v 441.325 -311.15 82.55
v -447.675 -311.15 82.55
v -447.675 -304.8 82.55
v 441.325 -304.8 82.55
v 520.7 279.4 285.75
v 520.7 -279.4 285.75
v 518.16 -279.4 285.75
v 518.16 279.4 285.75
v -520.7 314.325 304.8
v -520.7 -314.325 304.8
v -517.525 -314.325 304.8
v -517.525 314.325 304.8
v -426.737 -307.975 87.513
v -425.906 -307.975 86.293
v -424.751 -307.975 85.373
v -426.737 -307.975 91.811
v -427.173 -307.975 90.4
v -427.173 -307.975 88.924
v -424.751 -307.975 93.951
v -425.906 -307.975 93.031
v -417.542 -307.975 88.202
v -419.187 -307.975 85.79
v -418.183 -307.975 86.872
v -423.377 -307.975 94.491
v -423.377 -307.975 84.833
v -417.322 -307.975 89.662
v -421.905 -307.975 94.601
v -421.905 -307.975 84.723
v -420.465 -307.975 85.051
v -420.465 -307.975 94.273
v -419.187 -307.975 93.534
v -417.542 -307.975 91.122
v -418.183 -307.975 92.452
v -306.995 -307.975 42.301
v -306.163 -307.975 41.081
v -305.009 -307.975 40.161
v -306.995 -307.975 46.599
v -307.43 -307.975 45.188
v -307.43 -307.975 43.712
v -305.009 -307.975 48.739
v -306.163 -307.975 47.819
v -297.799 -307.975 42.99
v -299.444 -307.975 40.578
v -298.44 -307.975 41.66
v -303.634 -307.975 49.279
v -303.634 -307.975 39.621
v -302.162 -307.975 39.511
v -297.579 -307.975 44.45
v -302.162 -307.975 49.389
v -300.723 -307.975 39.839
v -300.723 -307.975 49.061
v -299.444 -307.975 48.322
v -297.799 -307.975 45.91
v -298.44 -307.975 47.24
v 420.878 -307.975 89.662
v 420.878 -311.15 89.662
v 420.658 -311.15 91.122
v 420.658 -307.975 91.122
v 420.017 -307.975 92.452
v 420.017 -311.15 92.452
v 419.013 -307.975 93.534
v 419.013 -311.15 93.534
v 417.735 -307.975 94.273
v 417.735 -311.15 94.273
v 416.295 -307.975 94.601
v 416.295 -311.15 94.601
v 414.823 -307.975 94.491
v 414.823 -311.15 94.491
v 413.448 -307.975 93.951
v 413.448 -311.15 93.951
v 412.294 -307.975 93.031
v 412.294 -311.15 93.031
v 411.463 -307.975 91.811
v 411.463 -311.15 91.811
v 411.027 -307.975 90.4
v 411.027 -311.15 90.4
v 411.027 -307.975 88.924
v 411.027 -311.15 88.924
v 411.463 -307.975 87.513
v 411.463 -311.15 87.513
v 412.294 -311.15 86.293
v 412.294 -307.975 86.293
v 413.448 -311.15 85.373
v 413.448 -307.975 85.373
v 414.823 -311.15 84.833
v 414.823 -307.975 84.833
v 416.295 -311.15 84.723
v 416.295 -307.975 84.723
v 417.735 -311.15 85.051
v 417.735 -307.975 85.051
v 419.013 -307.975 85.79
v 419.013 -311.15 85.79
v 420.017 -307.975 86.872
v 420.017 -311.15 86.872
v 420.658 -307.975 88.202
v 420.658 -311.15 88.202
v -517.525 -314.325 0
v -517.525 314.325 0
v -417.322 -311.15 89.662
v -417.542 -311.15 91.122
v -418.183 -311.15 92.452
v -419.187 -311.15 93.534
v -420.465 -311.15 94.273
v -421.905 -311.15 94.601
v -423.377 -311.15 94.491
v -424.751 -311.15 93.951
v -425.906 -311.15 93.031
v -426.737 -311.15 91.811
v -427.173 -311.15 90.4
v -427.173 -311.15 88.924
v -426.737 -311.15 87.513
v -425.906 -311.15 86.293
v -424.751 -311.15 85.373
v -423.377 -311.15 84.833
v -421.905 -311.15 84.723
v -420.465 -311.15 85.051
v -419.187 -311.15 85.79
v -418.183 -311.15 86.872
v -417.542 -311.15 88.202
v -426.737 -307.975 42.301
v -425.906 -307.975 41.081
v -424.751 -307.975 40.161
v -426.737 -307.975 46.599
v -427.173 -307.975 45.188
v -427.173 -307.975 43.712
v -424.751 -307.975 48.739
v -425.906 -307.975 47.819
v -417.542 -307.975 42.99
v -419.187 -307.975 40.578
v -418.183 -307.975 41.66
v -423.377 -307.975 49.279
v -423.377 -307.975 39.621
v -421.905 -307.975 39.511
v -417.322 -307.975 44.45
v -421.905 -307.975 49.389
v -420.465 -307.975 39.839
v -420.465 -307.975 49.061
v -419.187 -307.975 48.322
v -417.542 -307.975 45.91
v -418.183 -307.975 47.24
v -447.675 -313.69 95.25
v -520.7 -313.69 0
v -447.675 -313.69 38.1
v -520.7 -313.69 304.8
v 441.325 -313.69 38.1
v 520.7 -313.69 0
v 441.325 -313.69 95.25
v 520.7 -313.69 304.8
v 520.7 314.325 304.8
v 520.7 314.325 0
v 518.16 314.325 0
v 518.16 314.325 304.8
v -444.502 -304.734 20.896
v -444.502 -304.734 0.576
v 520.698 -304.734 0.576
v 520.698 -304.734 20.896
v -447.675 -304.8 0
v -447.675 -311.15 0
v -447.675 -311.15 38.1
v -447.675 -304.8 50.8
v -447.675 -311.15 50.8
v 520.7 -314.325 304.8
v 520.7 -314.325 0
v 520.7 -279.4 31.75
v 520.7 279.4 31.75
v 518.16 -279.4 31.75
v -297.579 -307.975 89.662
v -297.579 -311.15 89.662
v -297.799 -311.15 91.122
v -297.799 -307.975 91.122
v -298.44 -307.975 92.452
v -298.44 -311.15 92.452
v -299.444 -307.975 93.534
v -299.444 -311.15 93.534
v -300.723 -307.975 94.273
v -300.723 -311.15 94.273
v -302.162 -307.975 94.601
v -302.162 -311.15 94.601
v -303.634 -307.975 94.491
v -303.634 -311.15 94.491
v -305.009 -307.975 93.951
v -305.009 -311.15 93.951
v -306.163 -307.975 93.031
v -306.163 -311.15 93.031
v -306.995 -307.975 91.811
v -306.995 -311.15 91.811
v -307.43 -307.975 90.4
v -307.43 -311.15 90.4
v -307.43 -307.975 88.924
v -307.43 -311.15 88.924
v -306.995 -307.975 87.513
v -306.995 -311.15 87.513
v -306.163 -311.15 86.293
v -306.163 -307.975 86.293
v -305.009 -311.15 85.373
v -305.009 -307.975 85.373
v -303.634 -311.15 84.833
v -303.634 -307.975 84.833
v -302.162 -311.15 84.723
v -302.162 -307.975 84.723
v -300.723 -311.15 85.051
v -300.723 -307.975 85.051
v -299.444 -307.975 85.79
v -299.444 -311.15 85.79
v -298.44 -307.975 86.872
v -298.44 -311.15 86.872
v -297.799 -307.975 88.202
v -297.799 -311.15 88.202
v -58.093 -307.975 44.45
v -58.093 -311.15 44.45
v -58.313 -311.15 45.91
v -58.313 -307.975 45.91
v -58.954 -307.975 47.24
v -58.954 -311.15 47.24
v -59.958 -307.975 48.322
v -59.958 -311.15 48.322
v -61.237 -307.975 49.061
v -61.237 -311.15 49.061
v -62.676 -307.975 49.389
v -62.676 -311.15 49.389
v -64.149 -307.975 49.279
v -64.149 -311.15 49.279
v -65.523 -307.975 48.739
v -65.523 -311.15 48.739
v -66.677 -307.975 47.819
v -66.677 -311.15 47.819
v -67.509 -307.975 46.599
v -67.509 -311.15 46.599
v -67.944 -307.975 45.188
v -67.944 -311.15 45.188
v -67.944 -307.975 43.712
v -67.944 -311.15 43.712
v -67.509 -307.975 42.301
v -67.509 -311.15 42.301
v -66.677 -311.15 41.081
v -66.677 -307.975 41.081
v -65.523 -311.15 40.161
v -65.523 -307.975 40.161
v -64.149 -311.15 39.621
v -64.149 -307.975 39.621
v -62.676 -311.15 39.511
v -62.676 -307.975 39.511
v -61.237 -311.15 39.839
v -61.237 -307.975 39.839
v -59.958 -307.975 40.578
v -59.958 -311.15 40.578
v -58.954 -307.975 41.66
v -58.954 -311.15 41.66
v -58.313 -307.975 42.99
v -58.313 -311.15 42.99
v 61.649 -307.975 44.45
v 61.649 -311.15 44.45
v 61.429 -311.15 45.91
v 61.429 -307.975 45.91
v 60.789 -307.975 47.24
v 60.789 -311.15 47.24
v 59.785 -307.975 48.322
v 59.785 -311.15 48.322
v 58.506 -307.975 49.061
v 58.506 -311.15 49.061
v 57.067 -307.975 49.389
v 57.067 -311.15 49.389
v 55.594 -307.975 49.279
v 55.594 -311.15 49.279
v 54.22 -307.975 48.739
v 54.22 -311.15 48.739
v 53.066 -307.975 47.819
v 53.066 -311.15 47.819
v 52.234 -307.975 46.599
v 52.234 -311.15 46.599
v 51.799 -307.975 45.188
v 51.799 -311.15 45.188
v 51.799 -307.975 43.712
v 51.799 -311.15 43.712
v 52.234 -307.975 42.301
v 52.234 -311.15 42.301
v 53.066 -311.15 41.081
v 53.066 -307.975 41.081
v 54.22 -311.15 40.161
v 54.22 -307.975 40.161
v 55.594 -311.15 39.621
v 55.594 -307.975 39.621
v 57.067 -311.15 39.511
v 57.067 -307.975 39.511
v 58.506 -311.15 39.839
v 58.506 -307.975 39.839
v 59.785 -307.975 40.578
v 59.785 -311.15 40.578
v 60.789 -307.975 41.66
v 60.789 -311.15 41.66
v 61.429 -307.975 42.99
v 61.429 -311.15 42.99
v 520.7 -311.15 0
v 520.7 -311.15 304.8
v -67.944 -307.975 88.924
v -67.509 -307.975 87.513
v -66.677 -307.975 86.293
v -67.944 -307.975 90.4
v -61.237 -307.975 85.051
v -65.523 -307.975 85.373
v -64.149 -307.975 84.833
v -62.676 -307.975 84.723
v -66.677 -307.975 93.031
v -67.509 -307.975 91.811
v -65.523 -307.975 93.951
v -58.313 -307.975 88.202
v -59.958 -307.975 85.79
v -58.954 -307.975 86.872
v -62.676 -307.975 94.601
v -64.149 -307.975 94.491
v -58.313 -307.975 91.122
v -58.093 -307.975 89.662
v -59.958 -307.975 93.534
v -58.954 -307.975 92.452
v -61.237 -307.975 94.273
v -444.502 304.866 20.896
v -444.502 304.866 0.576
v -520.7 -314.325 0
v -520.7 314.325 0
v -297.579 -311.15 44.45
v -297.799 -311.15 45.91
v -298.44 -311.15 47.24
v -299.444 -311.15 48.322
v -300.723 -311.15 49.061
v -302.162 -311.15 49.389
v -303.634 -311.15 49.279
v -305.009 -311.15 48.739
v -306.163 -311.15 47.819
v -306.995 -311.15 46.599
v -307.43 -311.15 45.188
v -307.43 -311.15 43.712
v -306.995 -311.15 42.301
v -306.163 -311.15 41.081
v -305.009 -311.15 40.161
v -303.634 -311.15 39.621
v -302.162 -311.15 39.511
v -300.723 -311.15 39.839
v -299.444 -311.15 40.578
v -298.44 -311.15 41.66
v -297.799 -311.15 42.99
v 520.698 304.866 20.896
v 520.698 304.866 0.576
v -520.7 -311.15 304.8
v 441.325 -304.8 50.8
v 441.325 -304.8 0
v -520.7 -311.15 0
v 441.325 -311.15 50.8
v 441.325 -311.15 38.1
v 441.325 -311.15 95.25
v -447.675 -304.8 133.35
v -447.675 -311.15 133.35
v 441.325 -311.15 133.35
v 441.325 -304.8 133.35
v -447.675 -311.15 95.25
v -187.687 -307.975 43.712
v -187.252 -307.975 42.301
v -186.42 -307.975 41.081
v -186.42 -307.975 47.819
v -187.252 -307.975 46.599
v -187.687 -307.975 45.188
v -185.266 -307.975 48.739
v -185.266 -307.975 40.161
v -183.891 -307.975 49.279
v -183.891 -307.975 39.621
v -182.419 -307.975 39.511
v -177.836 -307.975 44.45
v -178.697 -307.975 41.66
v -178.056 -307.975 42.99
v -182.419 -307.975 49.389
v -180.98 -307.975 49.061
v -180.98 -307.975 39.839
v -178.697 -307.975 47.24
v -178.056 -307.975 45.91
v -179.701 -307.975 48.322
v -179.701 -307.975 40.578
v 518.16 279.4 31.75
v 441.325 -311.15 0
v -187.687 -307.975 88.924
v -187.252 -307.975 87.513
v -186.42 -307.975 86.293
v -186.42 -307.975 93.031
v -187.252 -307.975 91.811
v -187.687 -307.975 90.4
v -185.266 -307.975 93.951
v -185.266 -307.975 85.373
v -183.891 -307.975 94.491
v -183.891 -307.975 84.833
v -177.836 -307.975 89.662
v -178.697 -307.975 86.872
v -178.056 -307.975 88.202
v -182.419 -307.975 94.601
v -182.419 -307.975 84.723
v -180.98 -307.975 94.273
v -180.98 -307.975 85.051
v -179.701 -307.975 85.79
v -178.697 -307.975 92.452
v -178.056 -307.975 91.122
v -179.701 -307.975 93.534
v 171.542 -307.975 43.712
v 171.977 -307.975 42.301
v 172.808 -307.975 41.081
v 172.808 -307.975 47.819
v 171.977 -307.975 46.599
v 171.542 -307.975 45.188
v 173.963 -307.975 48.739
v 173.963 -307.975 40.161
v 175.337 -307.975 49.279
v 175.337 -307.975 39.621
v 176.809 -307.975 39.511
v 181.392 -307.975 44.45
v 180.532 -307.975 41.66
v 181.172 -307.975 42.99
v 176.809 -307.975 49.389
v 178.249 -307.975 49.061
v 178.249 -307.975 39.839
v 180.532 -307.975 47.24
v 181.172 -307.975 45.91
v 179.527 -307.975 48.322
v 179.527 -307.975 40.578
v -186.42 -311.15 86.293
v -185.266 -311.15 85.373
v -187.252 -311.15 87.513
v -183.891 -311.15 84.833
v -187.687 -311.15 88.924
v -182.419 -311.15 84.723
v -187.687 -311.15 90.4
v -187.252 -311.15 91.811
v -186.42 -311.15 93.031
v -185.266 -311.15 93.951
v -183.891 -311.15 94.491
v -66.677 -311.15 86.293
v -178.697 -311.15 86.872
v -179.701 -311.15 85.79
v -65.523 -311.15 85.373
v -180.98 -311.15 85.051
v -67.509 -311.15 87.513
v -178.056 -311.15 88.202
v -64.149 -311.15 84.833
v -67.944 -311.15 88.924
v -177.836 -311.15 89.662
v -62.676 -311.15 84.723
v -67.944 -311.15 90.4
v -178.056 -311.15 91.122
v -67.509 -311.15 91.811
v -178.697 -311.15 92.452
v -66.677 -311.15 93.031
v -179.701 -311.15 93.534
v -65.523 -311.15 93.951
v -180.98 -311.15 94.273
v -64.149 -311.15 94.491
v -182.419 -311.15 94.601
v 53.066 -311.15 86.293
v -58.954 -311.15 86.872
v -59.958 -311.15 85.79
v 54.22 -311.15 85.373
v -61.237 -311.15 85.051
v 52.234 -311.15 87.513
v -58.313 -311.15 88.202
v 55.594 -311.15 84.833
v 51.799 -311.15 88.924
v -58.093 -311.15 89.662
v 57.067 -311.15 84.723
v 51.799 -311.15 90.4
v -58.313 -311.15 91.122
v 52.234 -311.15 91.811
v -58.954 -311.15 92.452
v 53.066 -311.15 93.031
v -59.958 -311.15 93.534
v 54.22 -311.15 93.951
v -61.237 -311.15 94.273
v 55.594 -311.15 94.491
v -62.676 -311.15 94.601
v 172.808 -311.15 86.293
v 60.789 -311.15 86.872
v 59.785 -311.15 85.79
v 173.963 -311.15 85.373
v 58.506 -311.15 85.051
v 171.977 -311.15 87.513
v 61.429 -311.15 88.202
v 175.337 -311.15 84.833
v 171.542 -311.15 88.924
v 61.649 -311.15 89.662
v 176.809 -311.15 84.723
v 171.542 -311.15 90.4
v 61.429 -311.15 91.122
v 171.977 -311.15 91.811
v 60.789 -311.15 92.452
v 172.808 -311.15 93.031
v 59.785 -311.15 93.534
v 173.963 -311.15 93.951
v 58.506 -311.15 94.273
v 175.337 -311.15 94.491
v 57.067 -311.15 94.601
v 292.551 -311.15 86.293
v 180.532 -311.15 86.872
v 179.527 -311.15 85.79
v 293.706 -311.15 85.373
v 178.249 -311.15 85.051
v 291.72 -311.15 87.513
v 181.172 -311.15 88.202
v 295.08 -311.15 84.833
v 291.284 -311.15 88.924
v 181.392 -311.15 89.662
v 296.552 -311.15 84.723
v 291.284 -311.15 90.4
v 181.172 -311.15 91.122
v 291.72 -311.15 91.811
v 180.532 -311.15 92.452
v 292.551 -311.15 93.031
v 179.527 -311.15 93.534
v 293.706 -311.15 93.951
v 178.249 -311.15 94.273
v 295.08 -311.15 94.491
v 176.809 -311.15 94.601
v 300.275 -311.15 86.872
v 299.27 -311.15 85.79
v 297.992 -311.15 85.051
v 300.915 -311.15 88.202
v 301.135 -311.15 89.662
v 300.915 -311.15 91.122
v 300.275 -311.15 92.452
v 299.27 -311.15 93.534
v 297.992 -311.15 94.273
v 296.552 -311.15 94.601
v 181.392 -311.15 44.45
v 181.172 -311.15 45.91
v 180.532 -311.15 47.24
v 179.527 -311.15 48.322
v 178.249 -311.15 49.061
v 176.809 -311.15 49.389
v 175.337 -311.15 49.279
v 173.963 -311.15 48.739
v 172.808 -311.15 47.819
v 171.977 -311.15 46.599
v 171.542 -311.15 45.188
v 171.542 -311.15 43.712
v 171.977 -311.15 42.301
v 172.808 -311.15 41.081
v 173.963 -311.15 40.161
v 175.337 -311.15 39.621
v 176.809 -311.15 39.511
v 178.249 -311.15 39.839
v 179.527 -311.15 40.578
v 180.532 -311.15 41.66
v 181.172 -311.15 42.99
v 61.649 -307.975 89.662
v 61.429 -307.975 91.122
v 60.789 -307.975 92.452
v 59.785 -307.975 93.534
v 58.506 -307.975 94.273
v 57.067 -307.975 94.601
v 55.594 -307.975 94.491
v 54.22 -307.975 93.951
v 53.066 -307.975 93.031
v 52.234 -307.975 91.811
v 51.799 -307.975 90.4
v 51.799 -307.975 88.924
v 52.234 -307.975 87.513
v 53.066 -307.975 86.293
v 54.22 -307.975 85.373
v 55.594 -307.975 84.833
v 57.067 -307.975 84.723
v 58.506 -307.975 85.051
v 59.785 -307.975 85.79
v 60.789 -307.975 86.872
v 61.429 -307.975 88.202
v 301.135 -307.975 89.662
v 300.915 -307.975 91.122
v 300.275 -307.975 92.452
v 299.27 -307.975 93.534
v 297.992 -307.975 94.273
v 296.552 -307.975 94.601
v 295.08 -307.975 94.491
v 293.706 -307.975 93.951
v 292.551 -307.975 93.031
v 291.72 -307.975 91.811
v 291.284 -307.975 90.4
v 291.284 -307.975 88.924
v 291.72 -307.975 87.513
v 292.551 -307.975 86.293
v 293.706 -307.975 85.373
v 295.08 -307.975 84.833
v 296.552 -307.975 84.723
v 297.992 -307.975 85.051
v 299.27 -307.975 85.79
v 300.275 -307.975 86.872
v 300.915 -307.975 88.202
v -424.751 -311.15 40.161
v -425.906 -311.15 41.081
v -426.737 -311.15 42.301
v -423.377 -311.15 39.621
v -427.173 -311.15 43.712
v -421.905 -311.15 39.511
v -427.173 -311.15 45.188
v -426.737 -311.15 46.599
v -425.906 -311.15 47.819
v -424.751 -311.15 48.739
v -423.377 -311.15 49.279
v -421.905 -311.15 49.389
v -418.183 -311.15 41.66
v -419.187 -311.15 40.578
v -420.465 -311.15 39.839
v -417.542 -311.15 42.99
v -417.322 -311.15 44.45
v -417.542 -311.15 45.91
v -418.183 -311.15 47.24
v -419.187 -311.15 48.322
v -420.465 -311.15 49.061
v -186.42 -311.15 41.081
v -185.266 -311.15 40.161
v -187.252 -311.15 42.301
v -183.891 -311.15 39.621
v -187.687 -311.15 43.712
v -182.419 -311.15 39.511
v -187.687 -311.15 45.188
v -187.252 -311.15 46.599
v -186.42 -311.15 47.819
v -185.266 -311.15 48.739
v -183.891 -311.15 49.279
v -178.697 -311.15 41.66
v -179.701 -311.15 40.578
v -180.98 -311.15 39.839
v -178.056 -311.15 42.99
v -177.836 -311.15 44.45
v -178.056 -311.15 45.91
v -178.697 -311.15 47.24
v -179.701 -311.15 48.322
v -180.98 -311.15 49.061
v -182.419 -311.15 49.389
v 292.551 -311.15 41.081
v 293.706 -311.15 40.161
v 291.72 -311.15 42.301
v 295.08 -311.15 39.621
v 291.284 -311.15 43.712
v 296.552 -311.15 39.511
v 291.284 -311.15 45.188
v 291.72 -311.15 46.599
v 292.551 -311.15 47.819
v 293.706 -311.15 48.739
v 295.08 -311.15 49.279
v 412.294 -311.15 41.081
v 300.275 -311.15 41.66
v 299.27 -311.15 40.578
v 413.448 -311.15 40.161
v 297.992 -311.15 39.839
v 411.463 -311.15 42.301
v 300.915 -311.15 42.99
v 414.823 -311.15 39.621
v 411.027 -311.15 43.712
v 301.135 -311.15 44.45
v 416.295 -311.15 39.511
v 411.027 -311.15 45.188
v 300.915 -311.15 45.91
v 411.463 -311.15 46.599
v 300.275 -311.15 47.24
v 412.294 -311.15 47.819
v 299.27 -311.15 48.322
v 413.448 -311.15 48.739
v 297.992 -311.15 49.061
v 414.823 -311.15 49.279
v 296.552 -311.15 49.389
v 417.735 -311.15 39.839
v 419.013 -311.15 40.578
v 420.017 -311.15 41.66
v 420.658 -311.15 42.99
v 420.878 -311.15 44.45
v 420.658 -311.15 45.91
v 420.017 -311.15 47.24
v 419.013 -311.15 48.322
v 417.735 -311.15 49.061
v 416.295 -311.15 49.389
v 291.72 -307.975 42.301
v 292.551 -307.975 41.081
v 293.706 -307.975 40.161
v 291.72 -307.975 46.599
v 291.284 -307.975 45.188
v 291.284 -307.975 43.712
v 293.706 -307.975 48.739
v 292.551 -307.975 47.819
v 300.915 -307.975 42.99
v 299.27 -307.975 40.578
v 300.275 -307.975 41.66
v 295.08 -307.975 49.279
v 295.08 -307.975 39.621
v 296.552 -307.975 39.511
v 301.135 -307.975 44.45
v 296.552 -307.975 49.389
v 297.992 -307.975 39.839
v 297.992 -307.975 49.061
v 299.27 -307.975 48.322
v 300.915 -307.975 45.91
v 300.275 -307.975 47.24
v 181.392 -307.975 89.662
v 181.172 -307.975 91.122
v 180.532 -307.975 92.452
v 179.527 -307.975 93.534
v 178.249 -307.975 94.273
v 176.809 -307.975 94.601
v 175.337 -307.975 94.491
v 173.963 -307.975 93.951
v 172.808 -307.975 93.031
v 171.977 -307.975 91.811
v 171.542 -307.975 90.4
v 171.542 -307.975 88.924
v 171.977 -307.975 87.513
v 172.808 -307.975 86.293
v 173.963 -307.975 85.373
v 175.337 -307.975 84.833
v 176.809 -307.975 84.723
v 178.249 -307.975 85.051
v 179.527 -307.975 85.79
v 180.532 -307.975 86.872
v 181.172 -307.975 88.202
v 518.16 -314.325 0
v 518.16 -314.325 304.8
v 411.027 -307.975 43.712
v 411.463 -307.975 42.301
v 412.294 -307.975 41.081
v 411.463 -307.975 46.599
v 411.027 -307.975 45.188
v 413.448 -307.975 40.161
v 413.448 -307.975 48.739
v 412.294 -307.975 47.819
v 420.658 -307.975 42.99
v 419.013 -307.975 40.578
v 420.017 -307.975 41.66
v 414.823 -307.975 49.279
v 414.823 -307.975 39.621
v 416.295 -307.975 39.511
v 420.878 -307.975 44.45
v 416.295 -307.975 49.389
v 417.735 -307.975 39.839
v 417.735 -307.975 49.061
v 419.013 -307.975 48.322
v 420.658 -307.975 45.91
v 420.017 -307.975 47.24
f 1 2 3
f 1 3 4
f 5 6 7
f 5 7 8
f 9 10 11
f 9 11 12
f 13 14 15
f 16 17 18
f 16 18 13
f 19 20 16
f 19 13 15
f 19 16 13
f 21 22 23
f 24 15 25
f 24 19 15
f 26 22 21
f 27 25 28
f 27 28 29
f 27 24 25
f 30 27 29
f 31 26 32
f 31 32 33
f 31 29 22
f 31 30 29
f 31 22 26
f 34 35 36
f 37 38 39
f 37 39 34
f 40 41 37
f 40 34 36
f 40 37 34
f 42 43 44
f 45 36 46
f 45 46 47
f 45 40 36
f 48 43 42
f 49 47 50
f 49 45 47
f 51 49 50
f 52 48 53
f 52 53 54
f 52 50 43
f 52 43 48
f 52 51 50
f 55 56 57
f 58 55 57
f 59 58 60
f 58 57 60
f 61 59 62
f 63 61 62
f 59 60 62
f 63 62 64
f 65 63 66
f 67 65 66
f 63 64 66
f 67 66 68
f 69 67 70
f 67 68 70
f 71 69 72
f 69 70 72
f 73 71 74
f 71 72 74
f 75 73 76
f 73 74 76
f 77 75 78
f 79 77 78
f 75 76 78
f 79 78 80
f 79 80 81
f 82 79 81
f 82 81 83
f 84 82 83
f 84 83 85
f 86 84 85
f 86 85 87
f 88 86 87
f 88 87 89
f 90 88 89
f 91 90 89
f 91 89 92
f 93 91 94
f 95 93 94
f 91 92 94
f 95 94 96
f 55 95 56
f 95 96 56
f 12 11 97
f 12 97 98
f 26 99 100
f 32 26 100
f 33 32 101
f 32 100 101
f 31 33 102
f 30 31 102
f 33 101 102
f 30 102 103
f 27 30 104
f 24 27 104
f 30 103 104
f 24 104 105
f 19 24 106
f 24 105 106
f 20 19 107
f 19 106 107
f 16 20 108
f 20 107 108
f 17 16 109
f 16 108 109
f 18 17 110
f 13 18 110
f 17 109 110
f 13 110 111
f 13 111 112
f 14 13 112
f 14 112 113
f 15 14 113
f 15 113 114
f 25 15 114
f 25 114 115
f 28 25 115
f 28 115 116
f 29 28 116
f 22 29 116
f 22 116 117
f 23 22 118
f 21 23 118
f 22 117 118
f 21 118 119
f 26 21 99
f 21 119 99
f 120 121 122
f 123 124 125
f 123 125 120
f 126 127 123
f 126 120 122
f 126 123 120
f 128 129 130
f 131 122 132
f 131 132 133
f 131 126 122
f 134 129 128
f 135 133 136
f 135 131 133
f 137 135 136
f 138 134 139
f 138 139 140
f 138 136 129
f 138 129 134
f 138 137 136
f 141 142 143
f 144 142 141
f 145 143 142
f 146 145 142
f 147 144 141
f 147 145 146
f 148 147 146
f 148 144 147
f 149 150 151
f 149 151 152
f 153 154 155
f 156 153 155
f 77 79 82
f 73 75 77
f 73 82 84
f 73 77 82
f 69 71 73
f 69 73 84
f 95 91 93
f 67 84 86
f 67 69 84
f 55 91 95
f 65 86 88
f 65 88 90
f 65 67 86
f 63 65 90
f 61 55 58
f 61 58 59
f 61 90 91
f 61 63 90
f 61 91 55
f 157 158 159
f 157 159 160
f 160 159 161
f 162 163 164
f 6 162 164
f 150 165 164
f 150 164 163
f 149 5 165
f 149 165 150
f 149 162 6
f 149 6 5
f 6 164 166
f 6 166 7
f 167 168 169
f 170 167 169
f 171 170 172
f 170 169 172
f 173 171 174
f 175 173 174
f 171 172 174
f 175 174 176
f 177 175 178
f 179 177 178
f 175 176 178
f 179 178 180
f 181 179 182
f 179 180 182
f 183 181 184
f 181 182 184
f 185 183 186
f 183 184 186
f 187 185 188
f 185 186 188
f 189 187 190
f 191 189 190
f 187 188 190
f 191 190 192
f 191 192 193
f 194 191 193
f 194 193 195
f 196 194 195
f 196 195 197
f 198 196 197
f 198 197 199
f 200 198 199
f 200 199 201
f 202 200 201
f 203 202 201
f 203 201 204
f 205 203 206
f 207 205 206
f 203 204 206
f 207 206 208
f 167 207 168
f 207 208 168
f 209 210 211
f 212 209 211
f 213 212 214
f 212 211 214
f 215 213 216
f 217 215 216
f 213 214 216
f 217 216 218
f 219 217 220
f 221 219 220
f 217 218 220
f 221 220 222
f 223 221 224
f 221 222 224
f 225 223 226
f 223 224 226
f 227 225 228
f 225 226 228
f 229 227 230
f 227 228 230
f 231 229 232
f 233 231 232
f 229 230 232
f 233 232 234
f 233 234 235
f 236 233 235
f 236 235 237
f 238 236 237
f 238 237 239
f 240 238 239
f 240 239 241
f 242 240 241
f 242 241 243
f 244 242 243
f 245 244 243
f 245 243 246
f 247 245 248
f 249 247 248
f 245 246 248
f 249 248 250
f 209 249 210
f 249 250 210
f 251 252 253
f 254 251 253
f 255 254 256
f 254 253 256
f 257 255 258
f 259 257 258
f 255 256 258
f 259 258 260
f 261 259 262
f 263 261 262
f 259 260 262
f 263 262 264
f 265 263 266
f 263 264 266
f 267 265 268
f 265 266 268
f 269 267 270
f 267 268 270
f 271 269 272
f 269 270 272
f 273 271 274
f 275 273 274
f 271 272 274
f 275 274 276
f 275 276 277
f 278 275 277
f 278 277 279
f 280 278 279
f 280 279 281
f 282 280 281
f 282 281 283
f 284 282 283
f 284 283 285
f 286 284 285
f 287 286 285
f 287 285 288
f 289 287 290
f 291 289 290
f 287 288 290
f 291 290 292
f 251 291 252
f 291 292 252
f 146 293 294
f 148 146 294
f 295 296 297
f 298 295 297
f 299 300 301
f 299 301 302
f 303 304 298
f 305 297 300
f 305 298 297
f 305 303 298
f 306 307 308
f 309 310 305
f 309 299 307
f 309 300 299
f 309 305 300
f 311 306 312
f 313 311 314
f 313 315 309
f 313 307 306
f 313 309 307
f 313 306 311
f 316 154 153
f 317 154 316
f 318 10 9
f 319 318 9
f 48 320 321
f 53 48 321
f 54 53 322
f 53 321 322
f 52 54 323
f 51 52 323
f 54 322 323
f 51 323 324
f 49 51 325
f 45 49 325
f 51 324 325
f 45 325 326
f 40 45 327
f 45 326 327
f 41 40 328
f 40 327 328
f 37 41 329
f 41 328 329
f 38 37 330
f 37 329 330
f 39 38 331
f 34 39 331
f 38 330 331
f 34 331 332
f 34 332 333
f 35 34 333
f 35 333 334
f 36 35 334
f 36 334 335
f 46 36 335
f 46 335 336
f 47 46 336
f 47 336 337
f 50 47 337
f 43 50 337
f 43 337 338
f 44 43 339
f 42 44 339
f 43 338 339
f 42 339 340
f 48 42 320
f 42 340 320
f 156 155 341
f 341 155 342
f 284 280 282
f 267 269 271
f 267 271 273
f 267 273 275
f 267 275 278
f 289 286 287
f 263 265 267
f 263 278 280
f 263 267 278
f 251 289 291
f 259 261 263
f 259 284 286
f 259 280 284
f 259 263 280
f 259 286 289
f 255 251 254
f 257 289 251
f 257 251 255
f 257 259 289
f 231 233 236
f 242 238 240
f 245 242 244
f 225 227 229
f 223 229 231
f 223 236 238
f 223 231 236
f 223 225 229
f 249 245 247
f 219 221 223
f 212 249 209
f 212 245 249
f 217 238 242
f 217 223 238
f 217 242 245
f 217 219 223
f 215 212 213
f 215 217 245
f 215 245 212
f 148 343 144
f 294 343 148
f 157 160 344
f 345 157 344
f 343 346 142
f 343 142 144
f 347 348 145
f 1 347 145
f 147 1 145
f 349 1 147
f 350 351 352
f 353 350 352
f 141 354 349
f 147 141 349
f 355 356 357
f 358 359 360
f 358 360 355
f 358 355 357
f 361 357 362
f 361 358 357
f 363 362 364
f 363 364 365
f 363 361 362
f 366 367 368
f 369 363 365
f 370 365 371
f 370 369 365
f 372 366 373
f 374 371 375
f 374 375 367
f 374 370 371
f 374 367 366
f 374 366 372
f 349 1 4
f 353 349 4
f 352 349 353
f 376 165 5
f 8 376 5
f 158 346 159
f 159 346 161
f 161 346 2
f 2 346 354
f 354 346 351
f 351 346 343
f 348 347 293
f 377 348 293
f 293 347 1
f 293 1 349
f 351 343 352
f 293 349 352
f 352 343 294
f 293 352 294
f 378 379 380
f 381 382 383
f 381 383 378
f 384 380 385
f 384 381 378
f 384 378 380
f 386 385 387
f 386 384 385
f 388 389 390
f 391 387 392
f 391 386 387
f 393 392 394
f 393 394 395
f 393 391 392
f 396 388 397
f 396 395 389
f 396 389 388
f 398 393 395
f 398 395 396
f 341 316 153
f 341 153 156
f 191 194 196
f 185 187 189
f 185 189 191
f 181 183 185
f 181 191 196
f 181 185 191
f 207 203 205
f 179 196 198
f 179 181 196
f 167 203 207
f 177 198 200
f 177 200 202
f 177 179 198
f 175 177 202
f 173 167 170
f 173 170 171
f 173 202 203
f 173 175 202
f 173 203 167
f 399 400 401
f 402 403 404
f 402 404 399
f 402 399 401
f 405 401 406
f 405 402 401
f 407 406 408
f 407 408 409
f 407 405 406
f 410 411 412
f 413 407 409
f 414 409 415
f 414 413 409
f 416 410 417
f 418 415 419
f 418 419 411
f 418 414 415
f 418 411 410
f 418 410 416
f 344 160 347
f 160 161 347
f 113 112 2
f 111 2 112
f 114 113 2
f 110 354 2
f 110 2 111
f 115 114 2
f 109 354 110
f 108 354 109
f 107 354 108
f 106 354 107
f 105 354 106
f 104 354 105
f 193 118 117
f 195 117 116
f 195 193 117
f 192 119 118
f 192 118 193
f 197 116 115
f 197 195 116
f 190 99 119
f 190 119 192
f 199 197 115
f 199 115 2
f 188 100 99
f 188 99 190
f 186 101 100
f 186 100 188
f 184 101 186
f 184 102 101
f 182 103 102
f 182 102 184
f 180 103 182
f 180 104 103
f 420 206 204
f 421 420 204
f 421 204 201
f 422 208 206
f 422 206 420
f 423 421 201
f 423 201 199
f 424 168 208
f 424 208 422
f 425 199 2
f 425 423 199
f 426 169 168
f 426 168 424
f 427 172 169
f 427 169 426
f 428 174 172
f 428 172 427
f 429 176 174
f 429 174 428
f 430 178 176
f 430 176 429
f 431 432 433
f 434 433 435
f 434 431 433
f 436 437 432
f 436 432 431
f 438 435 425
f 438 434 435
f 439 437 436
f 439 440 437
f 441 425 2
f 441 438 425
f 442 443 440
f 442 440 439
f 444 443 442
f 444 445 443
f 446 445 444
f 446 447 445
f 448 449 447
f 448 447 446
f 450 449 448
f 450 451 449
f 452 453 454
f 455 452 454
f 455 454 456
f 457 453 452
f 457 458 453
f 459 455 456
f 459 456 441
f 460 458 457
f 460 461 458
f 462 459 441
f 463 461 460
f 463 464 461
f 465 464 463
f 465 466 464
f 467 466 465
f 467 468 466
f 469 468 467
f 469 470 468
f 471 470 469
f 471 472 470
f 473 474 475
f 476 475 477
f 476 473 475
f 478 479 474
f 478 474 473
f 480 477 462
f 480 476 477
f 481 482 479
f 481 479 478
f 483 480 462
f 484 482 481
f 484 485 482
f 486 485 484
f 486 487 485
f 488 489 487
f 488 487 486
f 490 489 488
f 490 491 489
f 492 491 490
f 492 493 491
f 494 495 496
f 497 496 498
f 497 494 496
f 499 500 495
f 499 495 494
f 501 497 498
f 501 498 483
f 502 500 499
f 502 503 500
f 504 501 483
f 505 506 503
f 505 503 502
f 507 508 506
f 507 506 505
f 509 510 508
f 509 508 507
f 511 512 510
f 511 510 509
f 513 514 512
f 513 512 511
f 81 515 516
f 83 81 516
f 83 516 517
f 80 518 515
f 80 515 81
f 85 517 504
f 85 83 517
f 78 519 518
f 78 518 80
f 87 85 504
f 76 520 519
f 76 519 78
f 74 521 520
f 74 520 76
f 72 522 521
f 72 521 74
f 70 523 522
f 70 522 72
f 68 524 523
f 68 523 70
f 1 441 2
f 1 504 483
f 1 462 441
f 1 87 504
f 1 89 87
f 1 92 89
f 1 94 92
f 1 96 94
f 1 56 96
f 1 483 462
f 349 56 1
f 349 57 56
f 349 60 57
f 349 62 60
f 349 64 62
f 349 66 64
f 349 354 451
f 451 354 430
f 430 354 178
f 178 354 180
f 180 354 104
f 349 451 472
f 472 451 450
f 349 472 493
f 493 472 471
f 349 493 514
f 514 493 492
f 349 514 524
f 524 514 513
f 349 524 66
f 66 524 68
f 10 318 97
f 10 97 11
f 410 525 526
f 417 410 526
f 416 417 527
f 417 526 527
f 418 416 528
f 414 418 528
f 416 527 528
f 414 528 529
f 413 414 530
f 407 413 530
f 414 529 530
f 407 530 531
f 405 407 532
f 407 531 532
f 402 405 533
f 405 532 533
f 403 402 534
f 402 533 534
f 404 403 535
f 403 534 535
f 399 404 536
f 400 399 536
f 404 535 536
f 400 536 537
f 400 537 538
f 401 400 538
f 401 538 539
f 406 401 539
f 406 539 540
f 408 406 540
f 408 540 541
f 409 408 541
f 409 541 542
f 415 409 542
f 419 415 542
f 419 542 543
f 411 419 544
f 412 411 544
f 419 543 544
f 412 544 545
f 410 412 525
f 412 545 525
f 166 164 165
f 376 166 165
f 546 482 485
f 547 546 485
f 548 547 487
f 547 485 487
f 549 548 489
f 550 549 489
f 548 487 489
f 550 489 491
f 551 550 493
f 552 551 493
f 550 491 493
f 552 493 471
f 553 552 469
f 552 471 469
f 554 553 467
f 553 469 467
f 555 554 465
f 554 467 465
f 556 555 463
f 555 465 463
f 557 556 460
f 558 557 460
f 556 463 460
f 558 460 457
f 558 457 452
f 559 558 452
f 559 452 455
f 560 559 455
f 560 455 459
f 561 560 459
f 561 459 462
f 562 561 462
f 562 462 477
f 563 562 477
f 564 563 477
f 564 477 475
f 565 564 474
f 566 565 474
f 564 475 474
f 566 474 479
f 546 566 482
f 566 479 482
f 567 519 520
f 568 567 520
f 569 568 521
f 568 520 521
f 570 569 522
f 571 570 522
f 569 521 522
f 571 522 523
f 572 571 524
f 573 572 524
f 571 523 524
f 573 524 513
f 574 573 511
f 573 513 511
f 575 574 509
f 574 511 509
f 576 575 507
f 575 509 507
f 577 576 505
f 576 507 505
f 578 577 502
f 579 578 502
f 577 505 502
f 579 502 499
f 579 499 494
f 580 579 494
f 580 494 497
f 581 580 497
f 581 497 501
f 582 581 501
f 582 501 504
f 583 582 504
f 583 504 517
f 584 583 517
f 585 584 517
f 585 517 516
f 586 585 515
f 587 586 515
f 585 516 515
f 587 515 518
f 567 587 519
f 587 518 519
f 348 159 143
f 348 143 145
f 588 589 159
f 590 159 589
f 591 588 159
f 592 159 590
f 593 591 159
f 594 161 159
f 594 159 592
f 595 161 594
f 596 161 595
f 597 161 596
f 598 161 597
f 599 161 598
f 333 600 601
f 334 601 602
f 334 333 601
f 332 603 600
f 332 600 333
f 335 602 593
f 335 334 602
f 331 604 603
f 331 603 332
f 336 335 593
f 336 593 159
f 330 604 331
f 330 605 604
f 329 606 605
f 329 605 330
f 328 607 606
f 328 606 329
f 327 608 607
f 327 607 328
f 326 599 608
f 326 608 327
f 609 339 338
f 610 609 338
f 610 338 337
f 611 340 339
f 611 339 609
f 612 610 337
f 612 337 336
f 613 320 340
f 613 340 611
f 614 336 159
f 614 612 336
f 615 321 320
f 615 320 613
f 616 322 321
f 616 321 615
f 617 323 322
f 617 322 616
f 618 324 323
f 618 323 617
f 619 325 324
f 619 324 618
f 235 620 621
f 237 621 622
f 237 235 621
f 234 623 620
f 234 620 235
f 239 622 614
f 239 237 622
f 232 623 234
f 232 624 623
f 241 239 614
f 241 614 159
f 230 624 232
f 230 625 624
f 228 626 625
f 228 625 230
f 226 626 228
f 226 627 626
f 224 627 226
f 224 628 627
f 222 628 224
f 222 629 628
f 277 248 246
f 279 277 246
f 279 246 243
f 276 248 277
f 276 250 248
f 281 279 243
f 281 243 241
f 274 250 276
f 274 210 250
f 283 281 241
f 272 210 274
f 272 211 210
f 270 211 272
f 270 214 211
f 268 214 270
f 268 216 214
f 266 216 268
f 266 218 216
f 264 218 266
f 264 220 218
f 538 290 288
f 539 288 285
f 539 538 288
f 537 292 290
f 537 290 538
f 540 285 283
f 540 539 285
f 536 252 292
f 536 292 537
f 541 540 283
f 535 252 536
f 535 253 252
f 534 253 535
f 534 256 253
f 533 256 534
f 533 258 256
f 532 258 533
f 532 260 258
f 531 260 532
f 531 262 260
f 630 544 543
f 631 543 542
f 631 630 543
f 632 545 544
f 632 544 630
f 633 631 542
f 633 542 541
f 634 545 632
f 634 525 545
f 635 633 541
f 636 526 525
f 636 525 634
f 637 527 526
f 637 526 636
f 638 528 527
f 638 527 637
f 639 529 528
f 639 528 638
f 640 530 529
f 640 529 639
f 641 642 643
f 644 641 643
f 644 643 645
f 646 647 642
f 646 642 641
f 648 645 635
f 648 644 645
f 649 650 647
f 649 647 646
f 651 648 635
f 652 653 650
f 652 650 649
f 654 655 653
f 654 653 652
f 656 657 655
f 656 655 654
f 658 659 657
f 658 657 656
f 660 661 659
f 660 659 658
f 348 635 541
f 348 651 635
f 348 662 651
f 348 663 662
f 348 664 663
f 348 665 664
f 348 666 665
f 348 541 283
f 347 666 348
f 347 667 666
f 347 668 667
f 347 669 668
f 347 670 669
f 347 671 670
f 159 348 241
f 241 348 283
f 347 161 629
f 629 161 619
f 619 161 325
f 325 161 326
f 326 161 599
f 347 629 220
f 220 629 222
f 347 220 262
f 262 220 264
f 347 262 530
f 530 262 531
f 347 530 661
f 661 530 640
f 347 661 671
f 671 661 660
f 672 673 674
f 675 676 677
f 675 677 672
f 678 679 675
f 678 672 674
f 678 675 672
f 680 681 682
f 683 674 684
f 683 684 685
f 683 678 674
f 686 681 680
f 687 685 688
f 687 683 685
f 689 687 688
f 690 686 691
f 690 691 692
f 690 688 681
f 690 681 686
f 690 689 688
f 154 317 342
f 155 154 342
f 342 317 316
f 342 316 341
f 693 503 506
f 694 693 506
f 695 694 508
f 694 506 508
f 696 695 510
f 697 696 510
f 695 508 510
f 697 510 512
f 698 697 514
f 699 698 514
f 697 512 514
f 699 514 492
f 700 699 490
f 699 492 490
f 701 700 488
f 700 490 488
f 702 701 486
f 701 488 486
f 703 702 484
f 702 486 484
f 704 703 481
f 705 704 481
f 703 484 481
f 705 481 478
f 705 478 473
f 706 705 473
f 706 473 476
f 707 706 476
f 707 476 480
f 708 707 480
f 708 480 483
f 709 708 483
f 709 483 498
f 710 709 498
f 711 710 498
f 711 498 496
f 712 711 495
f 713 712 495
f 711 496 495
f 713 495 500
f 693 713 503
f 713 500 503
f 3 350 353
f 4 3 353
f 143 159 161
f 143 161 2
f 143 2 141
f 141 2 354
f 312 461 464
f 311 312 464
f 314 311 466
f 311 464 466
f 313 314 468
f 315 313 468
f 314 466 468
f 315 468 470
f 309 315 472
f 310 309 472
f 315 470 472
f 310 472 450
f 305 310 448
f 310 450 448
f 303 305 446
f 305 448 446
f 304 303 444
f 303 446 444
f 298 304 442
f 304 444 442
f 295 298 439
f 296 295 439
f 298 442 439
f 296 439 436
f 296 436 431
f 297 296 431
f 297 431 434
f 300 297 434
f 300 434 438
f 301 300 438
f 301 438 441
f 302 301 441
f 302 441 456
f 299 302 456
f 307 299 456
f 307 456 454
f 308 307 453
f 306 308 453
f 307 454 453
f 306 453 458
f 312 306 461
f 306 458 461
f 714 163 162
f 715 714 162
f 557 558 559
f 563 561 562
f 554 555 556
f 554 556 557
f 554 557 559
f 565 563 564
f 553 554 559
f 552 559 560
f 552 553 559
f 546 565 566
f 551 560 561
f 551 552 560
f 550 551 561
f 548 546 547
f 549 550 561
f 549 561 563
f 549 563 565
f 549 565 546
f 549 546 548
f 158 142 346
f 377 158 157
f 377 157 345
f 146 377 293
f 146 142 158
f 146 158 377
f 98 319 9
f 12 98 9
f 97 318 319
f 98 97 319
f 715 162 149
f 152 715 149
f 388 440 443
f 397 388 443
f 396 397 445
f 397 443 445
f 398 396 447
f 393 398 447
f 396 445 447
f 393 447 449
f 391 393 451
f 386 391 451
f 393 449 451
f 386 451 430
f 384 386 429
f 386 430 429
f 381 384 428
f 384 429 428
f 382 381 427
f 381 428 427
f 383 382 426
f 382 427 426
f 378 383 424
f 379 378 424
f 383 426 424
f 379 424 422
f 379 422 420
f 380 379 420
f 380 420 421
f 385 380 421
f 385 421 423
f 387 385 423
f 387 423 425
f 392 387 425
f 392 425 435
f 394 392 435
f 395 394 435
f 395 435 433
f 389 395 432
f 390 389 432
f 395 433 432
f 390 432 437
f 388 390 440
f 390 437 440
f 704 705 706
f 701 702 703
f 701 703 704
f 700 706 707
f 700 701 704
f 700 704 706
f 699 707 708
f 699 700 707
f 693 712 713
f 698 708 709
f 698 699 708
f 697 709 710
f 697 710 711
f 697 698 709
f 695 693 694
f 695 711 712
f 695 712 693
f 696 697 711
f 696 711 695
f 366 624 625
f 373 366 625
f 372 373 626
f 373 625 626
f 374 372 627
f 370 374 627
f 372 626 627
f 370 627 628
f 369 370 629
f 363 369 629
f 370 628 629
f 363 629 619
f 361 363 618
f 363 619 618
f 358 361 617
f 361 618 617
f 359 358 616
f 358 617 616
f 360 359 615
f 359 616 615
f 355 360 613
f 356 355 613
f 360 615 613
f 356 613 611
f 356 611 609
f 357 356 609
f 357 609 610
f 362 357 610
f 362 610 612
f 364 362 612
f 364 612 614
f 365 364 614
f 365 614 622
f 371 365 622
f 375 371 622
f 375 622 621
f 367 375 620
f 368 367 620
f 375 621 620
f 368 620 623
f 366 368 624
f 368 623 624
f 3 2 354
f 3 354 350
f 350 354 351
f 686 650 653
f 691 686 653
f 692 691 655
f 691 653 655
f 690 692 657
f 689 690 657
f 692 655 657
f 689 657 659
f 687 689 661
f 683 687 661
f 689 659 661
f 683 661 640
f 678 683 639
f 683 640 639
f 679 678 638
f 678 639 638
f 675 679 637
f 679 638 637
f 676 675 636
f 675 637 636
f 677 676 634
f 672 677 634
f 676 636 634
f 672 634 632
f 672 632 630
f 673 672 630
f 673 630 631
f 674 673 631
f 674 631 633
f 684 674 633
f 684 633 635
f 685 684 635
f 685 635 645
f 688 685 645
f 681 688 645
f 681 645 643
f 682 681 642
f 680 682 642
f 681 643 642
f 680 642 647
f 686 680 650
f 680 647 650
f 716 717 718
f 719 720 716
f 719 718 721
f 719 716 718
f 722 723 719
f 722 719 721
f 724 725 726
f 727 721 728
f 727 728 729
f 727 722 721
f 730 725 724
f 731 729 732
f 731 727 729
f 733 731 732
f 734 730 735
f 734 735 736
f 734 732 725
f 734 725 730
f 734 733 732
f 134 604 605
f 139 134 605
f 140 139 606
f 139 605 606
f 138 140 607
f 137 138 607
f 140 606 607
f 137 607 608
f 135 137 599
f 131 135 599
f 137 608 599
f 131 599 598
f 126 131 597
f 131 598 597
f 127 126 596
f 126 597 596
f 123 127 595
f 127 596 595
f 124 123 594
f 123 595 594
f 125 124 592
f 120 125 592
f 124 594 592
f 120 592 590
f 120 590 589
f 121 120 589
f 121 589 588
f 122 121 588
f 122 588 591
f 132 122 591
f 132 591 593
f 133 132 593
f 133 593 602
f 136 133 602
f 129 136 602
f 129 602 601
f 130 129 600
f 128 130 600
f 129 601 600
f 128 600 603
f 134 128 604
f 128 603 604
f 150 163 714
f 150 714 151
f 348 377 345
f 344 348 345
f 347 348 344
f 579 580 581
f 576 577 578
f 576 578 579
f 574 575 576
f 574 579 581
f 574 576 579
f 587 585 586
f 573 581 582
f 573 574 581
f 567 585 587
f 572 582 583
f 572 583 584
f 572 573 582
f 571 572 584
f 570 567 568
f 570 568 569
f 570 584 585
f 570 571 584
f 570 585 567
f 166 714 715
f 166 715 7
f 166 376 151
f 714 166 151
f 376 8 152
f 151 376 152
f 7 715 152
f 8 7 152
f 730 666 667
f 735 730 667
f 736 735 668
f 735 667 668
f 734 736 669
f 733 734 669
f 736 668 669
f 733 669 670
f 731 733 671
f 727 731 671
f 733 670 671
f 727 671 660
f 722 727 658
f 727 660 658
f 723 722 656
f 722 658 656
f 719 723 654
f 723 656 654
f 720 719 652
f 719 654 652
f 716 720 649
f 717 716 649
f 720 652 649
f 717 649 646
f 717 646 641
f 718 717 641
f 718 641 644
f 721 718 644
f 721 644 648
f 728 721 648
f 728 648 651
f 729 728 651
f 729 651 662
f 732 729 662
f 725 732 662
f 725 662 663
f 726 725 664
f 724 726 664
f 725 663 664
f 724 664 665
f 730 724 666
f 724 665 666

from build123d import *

# Parameters (mm, degrees)
SKETCH_W      = 965.2
SKETCH_H      = 609.6
PAD_DEPTH     = 20.32
SKETCH004_W   = 1041.4
SKETCH004_H   = 304.8
SKETCH004_W_2 = 889
SKETCH004_H_2 = 57.15
PAD002_DEPTH  = 2.54
SKETCH005_W   = 889
SKETCH005_H   = 50.8
SKETCH005_R   = 4.953
PAD008_DEPTH  = 3.175
SKETCH006_W   = 889
SKETCH006_H   = 50.8
PAD009_DEPTH  = 3.175
SKETCH007_W   = 628.65
SKETCH007_H   = 304.8
PAD007_DEPTH  = 3.175
SKETCH008_W   = 628.65
SKETCH008_H   = 304.8
SKETCH008_W_2 = 558.8
SKETCH008_H_2 = 254
PAD006_DEPTH  = 2.54


with BuildPart() as pad:
    # Sketch → Pad (new body)
    with BuildSketch(Plane.XY):
        with Locations((38.1, 0)):
            Rectangle(SKETCH_W, SKETCH_H)
    extrude(amount=PAD_DEPTH)


with BuildPart() as pad_1:
    # Body placement: moved
    add(pad.part.moved(Location((-0.001785, 0.065608, 0.576416))))


with BuildPart() as front:
    # Sketch004 → Pad002 (new body)
    with BuildSketch(Plane.XZ.offset(311.15)):
        with Locations((0, 152.4)):
            Rectangle(SKETCH004_W, SKETCH004_H)
        with Locations((-3.175, 66.675)):
            Rectangle(SKETCH004_W_2, SKETCH004_H_2, mode=Mode.SUBTRACT)
    extrude(amount=PAD002_DEPTH)

    # Sketch005 → Pad008 (join)
    with BuildSketch(Plane.XZ.offset(311.15)):
        with Locations((-3.175, 25.4)):
            Rectangle(SKETCH005_W, SKETCH005_H)
        with Locations((-422.275, 44.45)):
            Circle(SKETCH005_R, mode=Mode.SUBTRACT)
        with Locations((-302.532143, 44.45)):
            Circle(SKETCH005_R, mode=Mode.SUBTRACT)
        with Locations((-182.789286, 44.45)):
            Circle(SKETCH005_R, mode=Mode.SUBTRACT)
        with Locations((-63.046429, 44.45)):
            Circle(SKETCH005_R, mode=Mode.SUBTRACT)
        with Locations((56.696429, 44.45)):
            Circle(SKETCH005_R, mode=Mode.SUBTRACT)
        with Locations((176.439286, 44.45)):
            Circle(SKETCH005_R, mode=Mode.SUBTRACT)
        with Locations((296.182143, 44.45)):
            Circle(SKETCH005_R, mode=Mode.SUBTRACT)
        with Locations((415.925, 44.45)):
            Circle(SKETCH005_R, mode=Mode.SUBTRACT)
        with Locations((-3.175, 107.95)):
            Rectangle(SKETCH005_W, SKETCH005_H)
        with Locations((-422.275, 89.662)):
            Circle(SKETCH005_R, mode=Mode.SUBTRACT)
        with Locations((-302.532143, 89.662)):
            Circle(SKETCH005_R, mode=Mode.SUBTRACT)
        with Locations((-182.789286, 89.662)):
            Circle(SKETCH005_R, mode=Mode.SUBTRACT)
        with Locations((-63.046429, 89.662)):
            Circle(SKETCH005_R, mode=Mode.SUBTRACT)
        with Locations((56.696429, 89.662)):
            Circle(SKETCH005_R, mode=Mode.SUBTRACT)
        with Locations((176.439286, 89.662)):
            Circle(SKETCH005_R, mode=Mode.SUBTRACT)
        with Locations((296.182143, 89.662)):
            Circle(SKETCH005_R, mode=Mode.SUBTRACT)
        with Locations((415.925, 89.662)):
            Circle(SKETCH005_R, mode=Mode.SUBTRACT)
    extrude(amount=-PAD008_DEPTH)

    # Sketch006 → Pad009 (join)
    with BuildSketch(Plane.XZ.offset(307.975)):
        with Locations((-3.175, 25.4)):
            Rectangle(SKETCH006_W, SKETCH006_H)
        with Locations((-3.175, 107.95)):
            Rectangle(SKETCH006_W, SKETCH006_H)
    extrude(amount=-PAD009_DEPTH)


with BuildPart() as left:
    # Sketch007 → Pad007 (new body)
    with BuildSketch(Plane.YZ.offset(-520.7)):
        with Locations((0, 152.4)):
            Rectangle(SKETCH007_W, SKETCH007_H)
    extrude(amount=PAD007_DEPTH)


with BuildPart() as right:
    # Sketch008 → Pad006 (new body)
    with BuildSketch(Plane.YZ.offset(520.7)):
        with Locations((0, 152.4)):
            Rectangle(SKETCH008_W, SKETCH008_H)
        with Locations((0, 158.75)):
            Rectangle(SKETCH008_W_2, SKETCH008_H_2, mode=Mode.SUBTRACT)
    extrude(amount=-PAD006_DEPTH)


solid = Compound([pad_1.part, front.part, left.part, right.part])
